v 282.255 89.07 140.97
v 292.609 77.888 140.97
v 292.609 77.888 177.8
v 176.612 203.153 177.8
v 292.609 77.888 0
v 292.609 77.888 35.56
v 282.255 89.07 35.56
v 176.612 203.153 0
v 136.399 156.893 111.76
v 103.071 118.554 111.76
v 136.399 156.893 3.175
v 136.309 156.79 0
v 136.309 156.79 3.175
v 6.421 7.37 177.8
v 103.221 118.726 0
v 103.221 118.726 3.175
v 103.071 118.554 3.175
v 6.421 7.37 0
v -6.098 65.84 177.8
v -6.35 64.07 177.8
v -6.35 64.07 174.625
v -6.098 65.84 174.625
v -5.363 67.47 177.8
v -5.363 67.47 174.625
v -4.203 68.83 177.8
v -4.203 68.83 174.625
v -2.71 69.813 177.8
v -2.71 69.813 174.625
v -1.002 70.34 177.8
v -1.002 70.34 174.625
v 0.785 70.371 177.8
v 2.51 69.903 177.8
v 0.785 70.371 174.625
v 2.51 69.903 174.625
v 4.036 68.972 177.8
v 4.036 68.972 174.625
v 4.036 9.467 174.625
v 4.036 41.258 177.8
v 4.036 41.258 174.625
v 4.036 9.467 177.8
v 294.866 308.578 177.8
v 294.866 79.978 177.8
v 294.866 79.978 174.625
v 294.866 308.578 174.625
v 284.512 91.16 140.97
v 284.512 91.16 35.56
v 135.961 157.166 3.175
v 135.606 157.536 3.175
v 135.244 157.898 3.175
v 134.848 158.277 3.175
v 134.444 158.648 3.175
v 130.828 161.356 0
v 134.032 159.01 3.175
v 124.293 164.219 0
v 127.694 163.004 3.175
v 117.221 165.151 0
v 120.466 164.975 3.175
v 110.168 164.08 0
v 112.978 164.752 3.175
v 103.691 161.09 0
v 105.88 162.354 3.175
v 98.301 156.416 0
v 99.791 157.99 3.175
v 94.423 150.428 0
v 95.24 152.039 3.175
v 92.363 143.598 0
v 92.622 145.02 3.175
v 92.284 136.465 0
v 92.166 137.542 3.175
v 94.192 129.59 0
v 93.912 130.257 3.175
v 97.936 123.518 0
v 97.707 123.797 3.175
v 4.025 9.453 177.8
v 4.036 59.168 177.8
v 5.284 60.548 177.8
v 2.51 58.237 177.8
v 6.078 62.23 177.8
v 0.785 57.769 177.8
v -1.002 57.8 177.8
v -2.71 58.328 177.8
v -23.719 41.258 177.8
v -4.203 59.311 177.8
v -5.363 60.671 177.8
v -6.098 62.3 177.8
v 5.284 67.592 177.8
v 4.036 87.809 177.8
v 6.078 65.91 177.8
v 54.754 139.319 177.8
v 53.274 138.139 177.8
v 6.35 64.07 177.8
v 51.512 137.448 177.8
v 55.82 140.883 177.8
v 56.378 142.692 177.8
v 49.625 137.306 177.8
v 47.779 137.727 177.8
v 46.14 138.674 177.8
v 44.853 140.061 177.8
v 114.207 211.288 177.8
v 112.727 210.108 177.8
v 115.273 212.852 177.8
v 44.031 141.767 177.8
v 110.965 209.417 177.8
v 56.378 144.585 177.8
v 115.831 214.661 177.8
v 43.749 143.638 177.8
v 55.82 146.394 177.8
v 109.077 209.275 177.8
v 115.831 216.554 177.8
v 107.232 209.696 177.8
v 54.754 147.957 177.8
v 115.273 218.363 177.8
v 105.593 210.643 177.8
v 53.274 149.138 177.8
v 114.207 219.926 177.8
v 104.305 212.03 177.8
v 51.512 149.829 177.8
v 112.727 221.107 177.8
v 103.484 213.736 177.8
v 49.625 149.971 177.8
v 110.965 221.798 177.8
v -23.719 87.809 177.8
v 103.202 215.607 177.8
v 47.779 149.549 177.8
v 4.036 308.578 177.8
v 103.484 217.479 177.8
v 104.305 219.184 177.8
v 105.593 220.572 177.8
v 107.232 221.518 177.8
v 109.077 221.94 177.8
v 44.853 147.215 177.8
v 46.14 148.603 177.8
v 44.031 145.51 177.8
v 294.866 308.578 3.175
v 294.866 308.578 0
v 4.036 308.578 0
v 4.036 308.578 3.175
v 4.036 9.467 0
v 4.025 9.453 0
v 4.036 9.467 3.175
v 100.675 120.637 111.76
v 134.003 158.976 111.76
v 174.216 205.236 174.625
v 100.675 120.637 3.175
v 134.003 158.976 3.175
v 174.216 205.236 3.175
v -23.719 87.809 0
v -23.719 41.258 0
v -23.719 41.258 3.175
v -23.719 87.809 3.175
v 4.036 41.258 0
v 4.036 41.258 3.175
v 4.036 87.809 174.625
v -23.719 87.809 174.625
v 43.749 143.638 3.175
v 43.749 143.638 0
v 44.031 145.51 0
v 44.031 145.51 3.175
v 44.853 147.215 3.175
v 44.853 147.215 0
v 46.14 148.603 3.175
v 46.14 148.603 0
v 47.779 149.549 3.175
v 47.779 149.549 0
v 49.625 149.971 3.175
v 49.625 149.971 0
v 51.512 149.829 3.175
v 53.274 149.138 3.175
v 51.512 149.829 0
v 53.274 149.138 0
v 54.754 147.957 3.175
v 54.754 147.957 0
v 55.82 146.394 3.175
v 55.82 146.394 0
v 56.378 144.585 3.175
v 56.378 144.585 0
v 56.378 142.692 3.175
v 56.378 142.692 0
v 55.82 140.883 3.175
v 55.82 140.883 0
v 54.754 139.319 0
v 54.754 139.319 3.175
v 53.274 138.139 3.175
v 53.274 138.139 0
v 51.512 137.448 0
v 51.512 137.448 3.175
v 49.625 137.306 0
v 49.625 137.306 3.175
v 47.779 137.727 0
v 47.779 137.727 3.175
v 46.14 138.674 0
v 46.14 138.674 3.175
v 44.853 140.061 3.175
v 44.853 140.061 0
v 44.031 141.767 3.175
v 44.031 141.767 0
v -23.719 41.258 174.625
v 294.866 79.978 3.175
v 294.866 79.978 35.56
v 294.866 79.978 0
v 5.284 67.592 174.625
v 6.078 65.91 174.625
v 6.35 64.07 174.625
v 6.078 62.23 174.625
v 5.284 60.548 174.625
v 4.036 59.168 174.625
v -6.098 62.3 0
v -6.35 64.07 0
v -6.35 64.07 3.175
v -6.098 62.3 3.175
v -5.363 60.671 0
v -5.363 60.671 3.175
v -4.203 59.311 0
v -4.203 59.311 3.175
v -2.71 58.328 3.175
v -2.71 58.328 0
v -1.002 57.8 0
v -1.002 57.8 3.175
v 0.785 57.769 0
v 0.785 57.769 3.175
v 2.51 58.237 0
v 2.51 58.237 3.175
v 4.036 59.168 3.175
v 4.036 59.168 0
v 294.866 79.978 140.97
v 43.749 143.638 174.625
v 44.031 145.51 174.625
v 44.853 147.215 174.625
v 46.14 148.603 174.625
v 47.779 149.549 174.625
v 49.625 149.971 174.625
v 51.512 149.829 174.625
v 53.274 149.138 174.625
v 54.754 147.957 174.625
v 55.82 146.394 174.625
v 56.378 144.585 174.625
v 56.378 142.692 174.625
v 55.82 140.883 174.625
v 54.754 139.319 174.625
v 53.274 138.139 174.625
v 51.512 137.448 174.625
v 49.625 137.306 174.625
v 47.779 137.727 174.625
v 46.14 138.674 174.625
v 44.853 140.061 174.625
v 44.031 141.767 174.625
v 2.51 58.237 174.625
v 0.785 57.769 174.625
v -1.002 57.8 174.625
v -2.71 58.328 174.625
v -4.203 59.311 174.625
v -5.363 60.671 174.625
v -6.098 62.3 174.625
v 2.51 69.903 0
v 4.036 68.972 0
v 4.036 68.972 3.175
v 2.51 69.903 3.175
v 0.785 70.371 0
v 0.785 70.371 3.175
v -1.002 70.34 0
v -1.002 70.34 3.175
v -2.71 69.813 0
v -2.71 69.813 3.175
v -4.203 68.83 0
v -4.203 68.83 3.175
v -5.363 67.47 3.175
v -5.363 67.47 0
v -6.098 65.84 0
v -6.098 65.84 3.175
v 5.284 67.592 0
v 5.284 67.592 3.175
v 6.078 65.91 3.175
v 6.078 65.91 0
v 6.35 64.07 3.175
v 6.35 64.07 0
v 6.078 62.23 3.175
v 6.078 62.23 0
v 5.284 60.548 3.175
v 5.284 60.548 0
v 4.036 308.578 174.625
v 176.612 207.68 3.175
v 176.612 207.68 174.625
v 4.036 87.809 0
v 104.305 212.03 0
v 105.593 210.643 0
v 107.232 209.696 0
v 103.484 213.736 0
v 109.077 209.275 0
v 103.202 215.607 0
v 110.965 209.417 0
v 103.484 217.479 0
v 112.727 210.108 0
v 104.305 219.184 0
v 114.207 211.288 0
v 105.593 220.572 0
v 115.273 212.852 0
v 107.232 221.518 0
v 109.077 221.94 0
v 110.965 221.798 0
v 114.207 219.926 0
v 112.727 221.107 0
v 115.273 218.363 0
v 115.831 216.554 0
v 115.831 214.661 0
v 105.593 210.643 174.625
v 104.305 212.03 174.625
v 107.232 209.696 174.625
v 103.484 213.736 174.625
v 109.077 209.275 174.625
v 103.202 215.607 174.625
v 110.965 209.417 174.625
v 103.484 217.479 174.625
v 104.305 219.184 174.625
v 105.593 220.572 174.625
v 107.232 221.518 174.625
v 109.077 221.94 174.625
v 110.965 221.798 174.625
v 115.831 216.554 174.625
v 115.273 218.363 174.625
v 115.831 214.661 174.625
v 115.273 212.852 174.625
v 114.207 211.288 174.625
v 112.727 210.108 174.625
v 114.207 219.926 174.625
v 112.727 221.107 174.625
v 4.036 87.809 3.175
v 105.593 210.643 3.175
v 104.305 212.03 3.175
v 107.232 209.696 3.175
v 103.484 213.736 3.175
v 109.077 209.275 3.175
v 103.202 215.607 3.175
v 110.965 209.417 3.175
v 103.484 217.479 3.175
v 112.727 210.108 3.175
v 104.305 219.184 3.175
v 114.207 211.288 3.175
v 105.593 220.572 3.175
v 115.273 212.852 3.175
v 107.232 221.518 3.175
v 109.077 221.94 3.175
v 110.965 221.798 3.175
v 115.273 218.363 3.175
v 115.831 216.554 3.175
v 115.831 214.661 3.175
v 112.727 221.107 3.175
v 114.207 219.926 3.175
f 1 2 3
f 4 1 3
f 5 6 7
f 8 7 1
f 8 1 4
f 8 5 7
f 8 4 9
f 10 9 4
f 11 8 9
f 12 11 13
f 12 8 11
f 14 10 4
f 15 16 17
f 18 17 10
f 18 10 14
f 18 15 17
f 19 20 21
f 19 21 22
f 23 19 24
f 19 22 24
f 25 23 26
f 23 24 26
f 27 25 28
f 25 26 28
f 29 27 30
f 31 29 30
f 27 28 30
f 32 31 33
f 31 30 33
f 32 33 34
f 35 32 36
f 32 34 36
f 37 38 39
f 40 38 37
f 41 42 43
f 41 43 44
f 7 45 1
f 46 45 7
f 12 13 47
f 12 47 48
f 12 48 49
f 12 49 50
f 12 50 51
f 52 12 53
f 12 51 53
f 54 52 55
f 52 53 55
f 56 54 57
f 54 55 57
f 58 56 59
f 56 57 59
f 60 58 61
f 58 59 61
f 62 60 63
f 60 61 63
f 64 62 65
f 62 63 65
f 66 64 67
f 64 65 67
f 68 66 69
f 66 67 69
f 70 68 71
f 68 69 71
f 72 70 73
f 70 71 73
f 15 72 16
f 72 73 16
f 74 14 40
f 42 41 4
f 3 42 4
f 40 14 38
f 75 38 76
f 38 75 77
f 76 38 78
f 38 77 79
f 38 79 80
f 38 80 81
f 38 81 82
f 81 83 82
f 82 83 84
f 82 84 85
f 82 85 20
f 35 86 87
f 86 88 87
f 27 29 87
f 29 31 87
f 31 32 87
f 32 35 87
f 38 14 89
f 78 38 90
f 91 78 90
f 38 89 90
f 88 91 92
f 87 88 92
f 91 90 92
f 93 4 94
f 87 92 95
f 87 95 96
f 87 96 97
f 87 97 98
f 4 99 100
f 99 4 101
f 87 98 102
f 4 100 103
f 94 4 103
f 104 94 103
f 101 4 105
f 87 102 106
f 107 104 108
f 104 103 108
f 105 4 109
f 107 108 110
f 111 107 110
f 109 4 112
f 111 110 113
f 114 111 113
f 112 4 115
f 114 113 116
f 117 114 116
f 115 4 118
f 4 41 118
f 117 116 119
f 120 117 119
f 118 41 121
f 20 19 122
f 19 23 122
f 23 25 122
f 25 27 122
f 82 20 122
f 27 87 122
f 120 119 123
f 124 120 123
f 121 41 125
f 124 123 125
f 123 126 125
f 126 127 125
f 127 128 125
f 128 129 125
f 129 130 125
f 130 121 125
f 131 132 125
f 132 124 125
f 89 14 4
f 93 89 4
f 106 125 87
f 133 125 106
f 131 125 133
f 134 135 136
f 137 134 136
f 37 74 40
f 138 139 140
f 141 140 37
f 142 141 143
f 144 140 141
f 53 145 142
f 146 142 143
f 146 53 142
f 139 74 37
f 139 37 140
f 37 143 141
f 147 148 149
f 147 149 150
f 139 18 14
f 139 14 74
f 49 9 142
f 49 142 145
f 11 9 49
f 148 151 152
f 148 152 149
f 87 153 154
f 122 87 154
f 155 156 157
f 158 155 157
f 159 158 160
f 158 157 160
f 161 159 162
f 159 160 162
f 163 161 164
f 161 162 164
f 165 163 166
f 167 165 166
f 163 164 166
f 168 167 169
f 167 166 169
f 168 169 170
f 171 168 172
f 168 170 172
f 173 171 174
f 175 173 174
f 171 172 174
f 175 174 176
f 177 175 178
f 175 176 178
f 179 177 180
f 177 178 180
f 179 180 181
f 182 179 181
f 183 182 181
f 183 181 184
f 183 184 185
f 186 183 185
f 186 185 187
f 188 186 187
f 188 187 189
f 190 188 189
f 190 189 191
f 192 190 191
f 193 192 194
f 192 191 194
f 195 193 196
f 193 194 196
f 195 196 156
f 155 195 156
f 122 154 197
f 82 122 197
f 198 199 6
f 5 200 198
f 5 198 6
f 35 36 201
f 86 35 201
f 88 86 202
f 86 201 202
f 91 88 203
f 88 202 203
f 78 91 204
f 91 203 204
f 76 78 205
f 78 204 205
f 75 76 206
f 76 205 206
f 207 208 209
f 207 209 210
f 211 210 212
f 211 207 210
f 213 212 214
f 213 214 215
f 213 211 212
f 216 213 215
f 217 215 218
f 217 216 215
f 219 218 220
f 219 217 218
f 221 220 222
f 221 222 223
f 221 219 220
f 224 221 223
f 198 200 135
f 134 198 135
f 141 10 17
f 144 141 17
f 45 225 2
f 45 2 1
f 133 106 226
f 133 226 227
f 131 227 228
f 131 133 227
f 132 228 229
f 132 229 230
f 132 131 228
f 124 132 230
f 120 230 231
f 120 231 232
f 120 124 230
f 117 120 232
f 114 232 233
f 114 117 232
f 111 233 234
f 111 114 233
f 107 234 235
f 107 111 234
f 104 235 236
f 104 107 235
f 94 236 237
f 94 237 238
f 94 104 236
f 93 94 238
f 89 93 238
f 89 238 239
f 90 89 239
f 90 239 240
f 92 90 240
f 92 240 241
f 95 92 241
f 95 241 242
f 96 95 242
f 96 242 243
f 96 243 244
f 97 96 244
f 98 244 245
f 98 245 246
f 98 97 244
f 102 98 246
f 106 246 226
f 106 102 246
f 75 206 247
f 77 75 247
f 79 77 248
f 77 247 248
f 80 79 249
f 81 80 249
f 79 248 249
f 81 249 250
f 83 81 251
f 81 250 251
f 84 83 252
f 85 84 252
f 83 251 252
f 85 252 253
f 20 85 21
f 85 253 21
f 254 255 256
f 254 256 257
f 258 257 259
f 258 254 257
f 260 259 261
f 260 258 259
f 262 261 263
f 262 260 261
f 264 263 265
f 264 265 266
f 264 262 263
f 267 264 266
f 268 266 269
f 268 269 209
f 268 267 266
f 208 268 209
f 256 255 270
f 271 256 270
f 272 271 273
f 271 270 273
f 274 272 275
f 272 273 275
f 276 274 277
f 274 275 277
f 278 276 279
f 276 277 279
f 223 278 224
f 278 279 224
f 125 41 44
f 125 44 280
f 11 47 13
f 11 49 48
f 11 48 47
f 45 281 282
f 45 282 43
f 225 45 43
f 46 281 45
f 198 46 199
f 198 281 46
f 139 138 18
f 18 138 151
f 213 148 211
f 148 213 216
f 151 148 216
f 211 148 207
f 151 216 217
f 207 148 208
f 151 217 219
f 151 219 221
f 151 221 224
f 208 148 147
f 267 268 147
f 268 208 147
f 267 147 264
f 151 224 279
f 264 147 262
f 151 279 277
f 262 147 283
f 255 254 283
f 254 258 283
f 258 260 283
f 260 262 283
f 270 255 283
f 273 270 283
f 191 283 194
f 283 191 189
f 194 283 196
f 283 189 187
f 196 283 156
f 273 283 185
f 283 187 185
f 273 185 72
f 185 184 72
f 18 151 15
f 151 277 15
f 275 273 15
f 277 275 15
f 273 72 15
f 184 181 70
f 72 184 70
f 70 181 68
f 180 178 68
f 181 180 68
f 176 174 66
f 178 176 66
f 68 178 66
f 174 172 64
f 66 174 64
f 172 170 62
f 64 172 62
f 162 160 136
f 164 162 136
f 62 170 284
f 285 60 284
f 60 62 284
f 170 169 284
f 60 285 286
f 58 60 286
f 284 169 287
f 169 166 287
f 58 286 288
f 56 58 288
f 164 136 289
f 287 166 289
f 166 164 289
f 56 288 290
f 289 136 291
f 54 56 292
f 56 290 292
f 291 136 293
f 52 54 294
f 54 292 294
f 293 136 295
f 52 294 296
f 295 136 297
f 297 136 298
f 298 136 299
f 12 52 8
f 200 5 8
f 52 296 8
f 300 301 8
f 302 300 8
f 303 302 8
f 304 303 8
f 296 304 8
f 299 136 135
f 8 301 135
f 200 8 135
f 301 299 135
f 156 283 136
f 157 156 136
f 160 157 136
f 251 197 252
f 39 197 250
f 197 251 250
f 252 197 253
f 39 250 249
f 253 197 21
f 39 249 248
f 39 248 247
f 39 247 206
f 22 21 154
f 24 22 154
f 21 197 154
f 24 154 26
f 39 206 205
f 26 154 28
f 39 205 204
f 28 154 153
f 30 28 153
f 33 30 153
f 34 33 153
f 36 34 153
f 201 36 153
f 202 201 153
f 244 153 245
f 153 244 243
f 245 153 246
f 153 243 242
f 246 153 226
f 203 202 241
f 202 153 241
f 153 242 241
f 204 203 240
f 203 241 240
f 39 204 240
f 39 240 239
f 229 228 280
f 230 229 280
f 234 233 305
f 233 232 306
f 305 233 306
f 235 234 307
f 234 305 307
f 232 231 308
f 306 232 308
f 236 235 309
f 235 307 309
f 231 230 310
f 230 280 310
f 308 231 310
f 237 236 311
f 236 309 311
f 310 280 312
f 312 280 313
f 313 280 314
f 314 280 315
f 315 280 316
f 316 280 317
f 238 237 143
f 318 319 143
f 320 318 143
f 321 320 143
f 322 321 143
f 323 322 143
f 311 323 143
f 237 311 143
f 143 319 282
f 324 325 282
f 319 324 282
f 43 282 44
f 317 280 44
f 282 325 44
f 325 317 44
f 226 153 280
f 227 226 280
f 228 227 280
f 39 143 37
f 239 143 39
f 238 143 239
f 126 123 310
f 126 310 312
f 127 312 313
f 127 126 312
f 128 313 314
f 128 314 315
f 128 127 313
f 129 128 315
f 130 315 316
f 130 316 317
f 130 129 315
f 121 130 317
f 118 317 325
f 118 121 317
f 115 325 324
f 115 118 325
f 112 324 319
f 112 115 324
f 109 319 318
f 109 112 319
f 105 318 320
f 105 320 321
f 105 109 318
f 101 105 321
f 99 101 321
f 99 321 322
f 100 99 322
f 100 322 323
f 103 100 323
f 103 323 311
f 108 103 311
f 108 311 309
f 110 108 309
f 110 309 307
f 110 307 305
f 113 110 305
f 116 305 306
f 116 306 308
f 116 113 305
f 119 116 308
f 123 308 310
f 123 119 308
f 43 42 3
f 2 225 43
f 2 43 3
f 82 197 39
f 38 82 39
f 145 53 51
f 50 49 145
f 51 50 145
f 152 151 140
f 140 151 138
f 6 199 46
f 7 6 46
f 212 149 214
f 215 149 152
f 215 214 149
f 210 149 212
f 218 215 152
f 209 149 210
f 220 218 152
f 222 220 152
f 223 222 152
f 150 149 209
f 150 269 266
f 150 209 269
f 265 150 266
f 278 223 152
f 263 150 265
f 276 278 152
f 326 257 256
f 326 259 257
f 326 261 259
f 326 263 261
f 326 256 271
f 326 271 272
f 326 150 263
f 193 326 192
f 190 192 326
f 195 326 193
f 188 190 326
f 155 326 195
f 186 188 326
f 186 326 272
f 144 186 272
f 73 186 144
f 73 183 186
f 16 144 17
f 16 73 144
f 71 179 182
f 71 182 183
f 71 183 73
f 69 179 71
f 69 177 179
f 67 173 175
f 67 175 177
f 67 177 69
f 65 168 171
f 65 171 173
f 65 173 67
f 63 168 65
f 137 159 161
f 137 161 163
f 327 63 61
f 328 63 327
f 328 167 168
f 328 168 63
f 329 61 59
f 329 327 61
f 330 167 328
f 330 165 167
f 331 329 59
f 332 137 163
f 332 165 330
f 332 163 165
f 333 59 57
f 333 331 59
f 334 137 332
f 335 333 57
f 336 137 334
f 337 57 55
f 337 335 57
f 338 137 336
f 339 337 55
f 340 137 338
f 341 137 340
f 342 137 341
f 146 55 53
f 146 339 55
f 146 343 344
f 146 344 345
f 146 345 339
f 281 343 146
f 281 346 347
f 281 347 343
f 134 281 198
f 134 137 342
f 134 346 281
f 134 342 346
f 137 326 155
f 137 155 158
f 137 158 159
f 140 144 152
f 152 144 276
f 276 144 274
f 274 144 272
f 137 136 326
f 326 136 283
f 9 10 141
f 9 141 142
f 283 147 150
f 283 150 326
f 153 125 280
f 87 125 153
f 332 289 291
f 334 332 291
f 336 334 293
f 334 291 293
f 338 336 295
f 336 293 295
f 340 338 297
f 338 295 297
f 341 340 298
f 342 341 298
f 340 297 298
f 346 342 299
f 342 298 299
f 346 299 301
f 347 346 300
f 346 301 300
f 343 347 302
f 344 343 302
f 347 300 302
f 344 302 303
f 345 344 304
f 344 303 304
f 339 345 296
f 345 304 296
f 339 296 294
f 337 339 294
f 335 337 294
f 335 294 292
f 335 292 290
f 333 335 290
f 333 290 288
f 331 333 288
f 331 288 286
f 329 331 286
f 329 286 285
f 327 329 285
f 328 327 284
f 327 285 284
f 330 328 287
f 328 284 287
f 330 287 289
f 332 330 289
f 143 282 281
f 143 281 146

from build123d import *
from build123d.topology import SkipClean

# Parameters (mm, degrees)
BOSS_EXTRUDE1_DEPTH    = 177.8
SKETCH2_R              = 6.35
BOSS_EXTRUDE2_DEPTH    = 3.175
CUT_EXTRUDE1_START     = -3.175
CUT_EXTRUDE1_OUTLINE_W = 50.8
CUT_EXTRUDE1_OUTLINE_H = 108.585
CUT_EXTRUDE1_DEPTH     = 3.175
SKETCH4_R              = 25.4
CUT_EXTRUDE2_DEPTH     = 5.08
BOSS_EXTRUDE3_DEPTH    = 3.175
BOSS_EXTRUDE4_START    = -3.175
BOSS_EXTRUDE4_DEPTH    = 3.175
SKETCH2_3_R            = 6.35
CUT_EXTRUDE3_DEPTH     = 203.2
SKETCH7_W              = 105.41
SKETCH7_H              = 15.24
CUT_EXTRUDE4_DEPTH     = 3.175


# Read off the part's stored shape, not the designer's step: Cut-Extrude1
with BuildPart() as part:
    # Sketch1 → Boss-Extrude1 (new body)
    with BuildSketch(Plane.XY):
        Polygon((174.215968213, 205.236242664), (176.61217113, 203.153255247), (6.420733494, 7.37040221), (4.024530577, 9.453389627), align=None)
        Polygon((176.61217113, 203.153255247), (176.61217113, 207.680393207), (174.215968213, 205.236242664), align=None)
        Polygon((176.61217113, 203.153255247), (176.61217113, 207.680393207), (294.86623267, 79.97762329), (292.609334988, 77.887713122), align=None)
    extrude(amount=BOSS_EXTRUDE1_DEPTH)

    # Sketch2 → Boss-Extrude2 (add)
    with BuildSketch(Plane(origin=(0, 0, 0), x_dir=(-1, 0, 0), z_dir=(0, 0, -1))):
        Polygon((-176.61217113, 207.680393207), (-294.86623267, 79.97762329), (-294.86623267, 308.57762329), (-4.03623267, 308.57762329), (-4.03623267, 9.466851346), align=None)
        with Locations((-109.551832016, 215.6073789)):
            Circle(SKETCH2_R, mode=Mode.SUBTRACT)
        with Locations((-50.099162461, 143.63835786)):
            Circle(SKETCH2_R, mode=Mode.SUBTRACT)
    boss_extrude2 = extrude(amount=-BOSS_EXTRUDE2_DEPTH)

    # Mirror1: Boss-Extrude2 across plane
    add(boss_extrude2.mirror(Plane.XY.offset(88.9)))

    # Cut-Extrude1 outline → Cut-Extrude1 (cut)
    with BuildSketch(Plane(origin=(-2.388376456, 2.076183978, 0), x_dir=(0.6560590289905027, 0.754709580222776, 0), z_dir=(-0.754709580222776, 0.6560590289905027, 0)).offset(CUT_EXTRUDE1_START)):
        with Locations((182.49489334, -57.4675)):
            Rectangle(CUT_EXTRUDE1_OUTLINE_W, CUT_EXTRUDE1_OUTLINE_H)
    extrude(amount=CUT_EXTRUDE1_DEPTH, mode=Mode.SUBTRACT)

    # Sketch4 → Cut-Extrude2 (cut)
    with BuildSketch(Plane.XY.offset(3.175)):
        with Locations((117.470149606, 139.752328242)):
            Circle(SKETCH4_R)
    extrude(amount=-CUT_EXTRUDE2_DEPTH, mode=Mode.SUBTRACT)

    # Sketch5 → Boss-Extrude3 (add)
    with BuildSketch(Plane(origin=(0, 0, 0), x_dir=(-1, 0, 0), z_dir=(0, 0, -1))):
        with BuildLine():
            Line((23.718677813, 87.809342908), (-4.03623267, 87.809342908))
            Line((-4.03623267, 87.809342908), (-4.03623267, 68.97229904))
            ThreePointArc((-4.03623267, 68.97229904), (2.710389506, 69.812621892), (6.35, 64.070123417))
            ThreePointArc((6.35, 64.070123417), (2.710389506, 58.327624943), (-4.03623267, 59.167947795))
            Line((-4.03623267, 59.167947795), (-4.03623267, 41.258157594))
            Line((-4.03623267, 41.258157594), (23.718677813, 41.258157594))
            Line((23.718677813, 41.258157594), (23.718677813, 87.809342908))
        make_face()
    extrude(amount=-BOSS_EXTRUDE3_DEPTH)

    # Sketch6 → Boss-Extrude4 (add)
    with BuildSketch(Plane.XY.offset(177.8).offset(BOSS_EXTRUDE4_START)):
        with BuildLine():
            Line((4.03623267, 68.97229904), (4.03623267, 87.809342908))
            Line((4.03623267, 87.809342908), (-23.718677813, 87.809342908))
            Line((-23.718677813, 87.809342908), (-23.718677813, 41.258157594))
            Line((-23.718677813, 41.258157594), (4.03623267, 41.258157594))
            Line((4.03623267, 41.258157594), (4.03623267, 59.167947795))
            ThreePointArc((4.03623267, 59.167947795), (-6.35, 64.070123417), (4.03623267, 68.97229904))
        make_face()
    extrude(amount=BOSS_EXTRUDE4_DEPTH)

    # Sketch2<3> → Cut-Extrude3 (cut)
    with SkipClean():  # the faces are left unmerged after this step: merging them gives an invalid solid
        with BuildSketch(Plane(origin=(0, 0, 0), x_dir=(-1, 0, 0), z_dir=(0, 0, -1))):
            with Locations((0, 64.070123417)):
                Circle(SKETCH2_3_R)
        extrude(amount=-CUT_EXTRUDE3_DEPTH, mode=Mode.SUBTRACT)

    # Sketch7 → Cut-Extrude4 (cut)
    with SkipClean():  # the faces are left unmerged after this step: merging them gives an invalid solid
        with BuildSketch(Plane(origin=(198.614996443, 183.919503291, 0), x_dir=(0, 0, -1), z_dir=(0.7337298645028701, 0.6794413042615234, 0))):
            with Locations((-88.265, -134.042327008)):
                Rectangle(SKETCH7_W, SKETCH7_H)
        extrude(amount=-CUT_EXTRUDE4_DEPTH, mode=Mode.SUBTRACT)


solid = part.part
